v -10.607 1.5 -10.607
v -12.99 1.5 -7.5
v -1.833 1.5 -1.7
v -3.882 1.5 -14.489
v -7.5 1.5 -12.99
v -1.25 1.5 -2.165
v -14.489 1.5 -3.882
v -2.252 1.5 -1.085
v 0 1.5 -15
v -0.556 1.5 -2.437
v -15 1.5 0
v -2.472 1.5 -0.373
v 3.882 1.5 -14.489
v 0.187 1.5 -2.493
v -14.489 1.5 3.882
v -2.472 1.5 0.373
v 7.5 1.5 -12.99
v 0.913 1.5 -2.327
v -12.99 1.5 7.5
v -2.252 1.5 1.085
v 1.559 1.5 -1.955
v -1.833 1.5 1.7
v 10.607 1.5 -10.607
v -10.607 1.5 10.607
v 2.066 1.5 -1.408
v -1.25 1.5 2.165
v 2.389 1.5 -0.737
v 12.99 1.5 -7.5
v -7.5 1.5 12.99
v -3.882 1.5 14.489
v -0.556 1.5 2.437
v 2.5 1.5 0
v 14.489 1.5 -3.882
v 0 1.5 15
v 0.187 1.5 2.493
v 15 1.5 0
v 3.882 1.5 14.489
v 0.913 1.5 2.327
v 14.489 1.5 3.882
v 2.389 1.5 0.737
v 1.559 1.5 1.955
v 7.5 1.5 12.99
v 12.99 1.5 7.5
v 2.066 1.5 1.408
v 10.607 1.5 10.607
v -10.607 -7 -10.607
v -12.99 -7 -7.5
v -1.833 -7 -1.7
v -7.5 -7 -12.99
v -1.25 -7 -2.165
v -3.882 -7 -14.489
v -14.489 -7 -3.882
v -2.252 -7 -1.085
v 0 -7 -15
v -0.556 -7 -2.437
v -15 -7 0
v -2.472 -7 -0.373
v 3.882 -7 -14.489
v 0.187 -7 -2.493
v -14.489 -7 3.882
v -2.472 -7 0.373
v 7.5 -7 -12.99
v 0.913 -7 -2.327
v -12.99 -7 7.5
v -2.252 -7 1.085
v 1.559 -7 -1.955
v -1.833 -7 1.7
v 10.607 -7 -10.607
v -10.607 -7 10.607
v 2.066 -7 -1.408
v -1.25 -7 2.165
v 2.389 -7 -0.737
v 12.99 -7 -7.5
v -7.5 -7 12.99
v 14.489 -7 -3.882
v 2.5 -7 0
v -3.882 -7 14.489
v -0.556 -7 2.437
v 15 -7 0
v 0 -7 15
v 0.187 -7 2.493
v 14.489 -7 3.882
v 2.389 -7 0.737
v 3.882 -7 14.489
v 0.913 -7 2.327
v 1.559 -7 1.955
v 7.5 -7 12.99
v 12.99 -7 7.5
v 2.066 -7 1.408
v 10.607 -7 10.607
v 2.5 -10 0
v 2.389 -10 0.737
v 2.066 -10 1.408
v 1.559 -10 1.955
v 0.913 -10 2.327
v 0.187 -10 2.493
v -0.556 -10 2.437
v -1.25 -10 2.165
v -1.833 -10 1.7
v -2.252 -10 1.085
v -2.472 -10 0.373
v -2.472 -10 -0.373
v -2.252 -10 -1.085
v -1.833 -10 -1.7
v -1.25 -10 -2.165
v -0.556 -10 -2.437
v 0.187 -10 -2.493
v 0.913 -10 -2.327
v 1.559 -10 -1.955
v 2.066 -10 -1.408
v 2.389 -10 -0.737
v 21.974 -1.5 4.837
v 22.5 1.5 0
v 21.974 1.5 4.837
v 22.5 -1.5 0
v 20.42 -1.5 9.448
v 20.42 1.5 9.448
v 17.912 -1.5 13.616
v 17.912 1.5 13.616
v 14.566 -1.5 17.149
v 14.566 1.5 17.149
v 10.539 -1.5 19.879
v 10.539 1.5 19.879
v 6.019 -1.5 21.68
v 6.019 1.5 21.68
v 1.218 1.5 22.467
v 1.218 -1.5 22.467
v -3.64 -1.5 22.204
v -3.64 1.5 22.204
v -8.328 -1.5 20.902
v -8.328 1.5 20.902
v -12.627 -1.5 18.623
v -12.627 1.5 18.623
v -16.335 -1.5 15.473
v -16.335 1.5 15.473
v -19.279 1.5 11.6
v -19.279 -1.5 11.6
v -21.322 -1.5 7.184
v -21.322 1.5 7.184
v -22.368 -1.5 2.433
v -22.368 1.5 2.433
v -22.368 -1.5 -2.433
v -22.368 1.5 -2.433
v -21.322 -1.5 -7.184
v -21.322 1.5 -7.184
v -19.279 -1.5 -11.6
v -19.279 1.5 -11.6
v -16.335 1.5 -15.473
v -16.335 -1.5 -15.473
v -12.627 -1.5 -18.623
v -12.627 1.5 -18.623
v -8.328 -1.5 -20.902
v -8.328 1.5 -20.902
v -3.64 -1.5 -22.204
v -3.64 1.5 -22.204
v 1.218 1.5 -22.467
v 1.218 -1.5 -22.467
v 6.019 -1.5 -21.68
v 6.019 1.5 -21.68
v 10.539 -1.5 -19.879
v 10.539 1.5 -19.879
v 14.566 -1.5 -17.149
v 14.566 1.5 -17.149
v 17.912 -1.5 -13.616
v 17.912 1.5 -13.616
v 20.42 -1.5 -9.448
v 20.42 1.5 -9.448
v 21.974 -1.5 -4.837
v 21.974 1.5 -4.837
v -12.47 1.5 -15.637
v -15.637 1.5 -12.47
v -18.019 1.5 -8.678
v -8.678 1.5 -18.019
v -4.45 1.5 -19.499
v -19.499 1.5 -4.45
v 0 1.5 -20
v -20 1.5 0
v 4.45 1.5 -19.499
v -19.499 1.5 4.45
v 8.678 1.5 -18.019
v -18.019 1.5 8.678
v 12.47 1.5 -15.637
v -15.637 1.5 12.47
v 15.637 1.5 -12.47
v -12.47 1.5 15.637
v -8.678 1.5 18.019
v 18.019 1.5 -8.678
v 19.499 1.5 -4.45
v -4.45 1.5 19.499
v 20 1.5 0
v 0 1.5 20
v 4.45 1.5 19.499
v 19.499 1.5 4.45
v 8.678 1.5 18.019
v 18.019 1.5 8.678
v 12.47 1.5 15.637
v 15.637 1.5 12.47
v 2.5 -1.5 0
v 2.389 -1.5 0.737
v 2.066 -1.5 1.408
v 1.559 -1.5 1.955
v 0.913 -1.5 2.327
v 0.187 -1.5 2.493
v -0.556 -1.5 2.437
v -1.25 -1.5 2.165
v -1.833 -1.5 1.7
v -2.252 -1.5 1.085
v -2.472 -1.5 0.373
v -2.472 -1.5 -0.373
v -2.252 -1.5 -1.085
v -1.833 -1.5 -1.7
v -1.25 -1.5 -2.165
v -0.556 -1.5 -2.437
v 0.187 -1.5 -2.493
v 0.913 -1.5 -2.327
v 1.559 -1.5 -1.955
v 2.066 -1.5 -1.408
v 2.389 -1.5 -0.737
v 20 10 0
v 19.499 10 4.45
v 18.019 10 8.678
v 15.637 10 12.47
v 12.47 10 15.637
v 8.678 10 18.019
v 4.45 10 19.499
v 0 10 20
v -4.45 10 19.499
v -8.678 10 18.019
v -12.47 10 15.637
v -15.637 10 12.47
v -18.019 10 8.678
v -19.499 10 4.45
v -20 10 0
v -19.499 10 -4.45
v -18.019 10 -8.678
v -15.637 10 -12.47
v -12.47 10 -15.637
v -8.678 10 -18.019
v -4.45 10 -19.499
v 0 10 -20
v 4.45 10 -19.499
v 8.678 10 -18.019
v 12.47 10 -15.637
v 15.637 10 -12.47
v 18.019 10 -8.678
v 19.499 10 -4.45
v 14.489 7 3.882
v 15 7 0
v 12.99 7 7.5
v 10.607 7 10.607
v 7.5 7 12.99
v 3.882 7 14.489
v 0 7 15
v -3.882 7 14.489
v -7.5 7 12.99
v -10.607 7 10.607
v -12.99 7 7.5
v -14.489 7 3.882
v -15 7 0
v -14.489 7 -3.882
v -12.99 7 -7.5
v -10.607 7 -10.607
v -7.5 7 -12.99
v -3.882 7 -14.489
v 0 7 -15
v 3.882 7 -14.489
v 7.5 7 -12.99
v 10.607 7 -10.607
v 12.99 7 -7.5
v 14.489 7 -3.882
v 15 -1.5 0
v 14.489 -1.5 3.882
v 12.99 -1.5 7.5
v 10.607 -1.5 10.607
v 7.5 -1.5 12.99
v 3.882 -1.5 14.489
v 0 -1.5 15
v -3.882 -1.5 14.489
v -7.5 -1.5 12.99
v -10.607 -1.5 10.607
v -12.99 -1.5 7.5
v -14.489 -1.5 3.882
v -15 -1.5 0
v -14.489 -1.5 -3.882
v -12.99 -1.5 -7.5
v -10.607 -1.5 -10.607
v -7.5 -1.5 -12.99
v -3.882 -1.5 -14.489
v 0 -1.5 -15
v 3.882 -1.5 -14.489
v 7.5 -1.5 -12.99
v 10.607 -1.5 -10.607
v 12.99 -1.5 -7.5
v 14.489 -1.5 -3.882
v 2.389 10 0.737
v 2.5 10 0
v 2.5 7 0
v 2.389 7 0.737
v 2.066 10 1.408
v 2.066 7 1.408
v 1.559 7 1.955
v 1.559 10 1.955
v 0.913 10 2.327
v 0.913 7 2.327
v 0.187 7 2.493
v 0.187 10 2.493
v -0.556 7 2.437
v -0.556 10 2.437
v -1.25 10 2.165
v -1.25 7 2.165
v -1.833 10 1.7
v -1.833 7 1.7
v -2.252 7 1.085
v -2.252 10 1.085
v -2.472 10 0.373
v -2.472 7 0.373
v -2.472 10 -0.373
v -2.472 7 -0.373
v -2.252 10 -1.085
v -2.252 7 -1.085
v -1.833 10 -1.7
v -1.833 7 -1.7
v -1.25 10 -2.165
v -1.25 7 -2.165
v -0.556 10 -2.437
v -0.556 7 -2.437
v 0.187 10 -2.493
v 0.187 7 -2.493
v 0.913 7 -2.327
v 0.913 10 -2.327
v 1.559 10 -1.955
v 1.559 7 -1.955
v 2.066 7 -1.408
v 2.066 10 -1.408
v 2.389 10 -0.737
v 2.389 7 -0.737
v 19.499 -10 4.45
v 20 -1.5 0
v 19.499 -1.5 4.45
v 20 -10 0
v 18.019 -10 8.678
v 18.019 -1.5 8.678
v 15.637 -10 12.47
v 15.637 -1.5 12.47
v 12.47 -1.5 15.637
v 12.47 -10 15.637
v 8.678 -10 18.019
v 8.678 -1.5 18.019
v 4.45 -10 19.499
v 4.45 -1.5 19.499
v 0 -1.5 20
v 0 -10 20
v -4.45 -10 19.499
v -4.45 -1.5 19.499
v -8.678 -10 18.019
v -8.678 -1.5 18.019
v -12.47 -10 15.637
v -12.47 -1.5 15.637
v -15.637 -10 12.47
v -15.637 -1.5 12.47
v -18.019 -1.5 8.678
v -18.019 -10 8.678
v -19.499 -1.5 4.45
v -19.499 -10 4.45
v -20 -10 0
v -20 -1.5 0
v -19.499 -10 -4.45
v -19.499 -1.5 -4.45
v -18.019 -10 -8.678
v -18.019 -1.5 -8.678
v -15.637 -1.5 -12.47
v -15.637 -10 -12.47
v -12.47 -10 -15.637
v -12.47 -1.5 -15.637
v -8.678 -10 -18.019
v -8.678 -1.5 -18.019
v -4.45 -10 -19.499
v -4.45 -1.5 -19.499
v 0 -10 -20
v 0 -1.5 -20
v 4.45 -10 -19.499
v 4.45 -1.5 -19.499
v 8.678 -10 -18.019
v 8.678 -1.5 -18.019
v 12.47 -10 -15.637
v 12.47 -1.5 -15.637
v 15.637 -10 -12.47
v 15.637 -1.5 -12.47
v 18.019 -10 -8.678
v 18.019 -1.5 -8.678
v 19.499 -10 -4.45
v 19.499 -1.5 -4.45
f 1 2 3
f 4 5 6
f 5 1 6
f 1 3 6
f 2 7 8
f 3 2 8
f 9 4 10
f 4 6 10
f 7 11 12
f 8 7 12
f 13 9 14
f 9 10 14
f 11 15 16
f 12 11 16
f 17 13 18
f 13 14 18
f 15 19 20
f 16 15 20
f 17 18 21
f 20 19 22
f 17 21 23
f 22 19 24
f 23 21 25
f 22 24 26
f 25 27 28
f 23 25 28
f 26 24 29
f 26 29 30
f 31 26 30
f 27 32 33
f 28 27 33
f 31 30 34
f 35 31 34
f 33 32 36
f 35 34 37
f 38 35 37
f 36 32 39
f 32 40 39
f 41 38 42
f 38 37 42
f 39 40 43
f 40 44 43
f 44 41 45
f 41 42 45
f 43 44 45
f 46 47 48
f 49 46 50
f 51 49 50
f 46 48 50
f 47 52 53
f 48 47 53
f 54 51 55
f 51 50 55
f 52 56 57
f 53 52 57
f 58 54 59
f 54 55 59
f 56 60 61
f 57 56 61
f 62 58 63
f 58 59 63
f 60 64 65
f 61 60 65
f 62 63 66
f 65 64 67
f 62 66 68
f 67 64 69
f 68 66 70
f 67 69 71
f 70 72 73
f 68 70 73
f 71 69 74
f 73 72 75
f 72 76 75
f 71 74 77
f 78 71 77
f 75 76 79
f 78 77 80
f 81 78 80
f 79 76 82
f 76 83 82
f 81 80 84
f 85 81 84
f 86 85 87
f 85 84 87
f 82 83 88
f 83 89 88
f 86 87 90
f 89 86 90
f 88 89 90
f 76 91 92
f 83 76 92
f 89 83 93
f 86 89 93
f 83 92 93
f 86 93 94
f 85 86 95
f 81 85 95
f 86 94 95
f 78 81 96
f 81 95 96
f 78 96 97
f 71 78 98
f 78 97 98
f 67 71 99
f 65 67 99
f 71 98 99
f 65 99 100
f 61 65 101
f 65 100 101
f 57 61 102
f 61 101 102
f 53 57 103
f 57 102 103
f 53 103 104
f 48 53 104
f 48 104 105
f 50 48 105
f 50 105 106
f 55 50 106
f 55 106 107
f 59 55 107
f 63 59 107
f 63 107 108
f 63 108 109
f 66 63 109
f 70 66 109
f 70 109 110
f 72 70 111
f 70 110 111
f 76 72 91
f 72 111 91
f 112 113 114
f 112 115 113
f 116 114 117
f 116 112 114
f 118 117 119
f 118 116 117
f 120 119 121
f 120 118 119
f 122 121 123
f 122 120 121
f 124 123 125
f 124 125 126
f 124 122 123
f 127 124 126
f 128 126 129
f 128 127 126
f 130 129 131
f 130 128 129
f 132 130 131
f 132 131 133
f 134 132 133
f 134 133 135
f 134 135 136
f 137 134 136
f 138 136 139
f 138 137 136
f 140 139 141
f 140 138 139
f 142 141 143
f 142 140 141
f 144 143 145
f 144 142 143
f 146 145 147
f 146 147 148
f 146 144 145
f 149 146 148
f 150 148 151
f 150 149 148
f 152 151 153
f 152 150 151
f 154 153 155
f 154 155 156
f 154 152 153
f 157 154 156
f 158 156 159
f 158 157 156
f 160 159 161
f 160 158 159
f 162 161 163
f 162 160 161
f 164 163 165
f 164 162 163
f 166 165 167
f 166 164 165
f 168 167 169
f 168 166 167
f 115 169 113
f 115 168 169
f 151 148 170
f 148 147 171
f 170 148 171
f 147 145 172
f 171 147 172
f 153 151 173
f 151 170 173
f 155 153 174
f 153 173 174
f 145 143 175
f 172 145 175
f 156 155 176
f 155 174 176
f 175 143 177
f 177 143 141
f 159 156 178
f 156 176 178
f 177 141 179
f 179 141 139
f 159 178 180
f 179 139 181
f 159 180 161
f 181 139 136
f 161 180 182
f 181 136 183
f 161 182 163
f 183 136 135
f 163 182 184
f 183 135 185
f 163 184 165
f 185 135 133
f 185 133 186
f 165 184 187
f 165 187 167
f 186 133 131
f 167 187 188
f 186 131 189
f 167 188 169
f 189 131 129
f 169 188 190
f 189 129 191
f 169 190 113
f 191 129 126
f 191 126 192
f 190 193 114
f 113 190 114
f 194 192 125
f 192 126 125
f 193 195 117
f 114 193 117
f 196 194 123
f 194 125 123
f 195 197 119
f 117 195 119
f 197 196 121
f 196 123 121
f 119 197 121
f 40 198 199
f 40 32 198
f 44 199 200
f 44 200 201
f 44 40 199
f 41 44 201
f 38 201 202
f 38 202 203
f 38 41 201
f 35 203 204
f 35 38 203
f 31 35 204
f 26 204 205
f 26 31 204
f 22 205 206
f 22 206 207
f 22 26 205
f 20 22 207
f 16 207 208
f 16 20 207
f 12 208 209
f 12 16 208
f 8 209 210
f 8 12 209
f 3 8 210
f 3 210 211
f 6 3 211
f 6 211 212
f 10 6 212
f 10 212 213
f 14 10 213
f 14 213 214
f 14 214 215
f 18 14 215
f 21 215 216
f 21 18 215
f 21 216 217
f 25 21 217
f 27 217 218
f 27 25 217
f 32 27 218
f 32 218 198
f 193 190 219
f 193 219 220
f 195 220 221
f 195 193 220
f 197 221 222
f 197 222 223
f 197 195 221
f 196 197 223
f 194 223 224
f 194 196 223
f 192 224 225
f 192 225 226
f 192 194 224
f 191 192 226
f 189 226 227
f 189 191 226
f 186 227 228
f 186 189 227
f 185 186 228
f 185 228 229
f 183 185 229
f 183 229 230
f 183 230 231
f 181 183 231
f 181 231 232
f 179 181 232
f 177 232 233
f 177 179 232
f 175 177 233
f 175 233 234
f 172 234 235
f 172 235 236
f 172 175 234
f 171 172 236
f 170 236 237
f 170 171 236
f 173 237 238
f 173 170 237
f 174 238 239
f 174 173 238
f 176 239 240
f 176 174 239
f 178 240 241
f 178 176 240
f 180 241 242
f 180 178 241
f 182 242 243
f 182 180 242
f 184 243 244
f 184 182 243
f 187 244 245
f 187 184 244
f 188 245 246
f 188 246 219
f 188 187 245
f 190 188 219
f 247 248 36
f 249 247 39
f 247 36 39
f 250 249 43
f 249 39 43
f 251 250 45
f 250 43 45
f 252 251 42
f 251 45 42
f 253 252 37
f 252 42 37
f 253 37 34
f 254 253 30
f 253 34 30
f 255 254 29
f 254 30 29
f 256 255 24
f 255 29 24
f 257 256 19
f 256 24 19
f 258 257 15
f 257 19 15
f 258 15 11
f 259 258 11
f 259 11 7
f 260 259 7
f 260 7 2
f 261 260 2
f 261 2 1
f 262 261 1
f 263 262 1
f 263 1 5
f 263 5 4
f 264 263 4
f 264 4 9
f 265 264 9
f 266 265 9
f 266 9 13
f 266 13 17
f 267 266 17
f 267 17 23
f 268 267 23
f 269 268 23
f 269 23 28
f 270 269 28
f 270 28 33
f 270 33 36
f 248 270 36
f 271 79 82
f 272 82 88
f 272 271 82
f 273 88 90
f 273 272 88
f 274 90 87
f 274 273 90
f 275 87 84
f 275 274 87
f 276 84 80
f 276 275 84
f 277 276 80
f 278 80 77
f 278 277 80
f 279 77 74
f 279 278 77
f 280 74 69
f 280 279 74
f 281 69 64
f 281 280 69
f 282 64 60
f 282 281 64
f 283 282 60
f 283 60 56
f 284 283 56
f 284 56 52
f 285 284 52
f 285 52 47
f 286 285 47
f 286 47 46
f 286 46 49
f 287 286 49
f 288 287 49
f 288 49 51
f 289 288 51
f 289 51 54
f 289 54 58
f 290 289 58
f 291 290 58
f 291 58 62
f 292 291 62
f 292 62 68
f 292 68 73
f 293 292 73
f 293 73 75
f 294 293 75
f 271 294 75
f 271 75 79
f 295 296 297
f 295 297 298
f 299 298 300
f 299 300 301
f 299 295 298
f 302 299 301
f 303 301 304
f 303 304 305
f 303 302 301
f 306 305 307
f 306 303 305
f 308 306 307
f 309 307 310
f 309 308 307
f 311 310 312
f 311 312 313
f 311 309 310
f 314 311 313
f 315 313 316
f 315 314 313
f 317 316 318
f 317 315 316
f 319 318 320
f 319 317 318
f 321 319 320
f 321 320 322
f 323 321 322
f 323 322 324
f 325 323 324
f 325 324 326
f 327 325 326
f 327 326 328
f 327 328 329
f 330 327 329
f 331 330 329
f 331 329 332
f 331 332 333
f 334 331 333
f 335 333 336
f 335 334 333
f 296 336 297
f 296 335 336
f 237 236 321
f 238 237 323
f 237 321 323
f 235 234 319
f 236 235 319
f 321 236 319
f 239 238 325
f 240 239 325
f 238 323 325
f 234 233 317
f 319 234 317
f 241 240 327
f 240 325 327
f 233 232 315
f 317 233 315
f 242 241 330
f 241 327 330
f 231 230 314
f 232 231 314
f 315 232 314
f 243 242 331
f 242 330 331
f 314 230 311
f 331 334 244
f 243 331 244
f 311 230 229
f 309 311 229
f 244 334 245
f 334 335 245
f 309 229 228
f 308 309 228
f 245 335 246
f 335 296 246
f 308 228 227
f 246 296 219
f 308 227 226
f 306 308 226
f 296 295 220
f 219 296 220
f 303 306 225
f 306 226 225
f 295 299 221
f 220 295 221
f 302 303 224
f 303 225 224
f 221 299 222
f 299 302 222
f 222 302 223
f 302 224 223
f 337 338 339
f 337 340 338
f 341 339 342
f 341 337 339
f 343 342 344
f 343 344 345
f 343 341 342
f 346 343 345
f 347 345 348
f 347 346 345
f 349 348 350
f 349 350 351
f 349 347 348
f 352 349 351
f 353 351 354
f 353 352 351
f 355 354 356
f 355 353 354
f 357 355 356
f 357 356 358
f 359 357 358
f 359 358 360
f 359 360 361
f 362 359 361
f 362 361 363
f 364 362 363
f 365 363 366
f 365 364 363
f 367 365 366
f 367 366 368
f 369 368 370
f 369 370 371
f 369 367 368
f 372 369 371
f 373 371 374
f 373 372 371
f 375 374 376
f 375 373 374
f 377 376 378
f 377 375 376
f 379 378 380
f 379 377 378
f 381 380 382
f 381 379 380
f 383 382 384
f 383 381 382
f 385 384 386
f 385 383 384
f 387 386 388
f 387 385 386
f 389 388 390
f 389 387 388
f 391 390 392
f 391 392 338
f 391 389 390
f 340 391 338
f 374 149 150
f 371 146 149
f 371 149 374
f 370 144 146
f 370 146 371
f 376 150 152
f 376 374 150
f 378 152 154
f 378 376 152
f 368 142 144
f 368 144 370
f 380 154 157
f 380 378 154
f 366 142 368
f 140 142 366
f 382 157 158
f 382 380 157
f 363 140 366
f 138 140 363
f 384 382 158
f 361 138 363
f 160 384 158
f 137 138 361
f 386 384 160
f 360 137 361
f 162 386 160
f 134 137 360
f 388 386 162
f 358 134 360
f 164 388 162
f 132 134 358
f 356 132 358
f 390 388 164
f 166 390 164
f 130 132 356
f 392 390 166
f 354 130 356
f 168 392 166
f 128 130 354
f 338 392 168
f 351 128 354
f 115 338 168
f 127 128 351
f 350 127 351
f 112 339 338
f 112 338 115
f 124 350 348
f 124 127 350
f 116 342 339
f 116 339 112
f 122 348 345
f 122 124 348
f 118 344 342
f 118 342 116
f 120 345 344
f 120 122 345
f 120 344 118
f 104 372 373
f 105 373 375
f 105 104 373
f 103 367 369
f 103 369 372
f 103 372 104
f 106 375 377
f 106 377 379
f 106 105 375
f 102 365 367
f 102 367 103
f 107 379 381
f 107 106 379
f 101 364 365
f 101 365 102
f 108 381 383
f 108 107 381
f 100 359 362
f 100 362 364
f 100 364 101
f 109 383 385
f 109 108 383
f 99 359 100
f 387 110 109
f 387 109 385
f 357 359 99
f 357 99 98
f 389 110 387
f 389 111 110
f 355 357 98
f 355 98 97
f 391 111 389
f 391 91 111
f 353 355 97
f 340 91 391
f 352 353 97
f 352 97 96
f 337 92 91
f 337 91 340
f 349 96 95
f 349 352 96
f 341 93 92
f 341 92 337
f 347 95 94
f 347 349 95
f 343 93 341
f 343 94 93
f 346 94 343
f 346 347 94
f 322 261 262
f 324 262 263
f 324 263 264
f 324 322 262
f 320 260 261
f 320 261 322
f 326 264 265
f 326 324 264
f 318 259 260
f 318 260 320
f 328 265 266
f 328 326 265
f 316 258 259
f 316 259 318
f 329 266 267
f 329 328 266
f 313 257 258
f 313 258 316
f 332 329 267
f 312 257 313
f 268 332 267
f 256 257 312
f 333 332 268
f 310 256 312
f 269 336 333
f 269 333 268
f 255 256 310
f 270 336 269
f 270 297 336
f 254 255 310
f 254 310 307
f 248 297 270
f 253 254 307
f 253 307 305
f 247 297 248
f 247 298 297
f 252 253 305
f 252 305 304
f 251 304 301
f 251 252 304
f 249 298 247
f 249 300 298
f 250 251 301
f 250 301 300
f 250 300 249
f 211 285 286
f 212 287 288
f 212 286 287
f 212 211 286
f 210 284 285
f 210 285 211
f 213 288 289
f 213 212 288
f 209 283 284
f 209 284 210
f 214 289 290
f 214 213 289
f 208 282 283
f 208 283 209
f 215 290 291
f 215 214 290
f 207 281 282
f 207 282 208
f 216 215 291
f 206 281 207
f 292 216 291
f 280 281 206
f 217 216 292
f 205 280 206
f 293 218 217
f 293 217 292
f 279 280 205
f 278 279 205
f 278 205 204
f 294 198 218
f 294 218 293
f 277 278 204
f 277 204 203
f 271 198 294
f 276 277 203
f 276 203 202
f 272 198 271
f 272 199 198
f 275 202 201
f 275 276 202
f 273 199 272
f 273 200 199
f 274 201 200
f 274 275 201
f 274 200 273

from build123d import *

# Parameters (mm, degrees)
F0_R     = 20
F0_R_2   = 15
F1_DEPTH = 10
F3_R     = 22.5
F3_R_2   = 2.5
F4_DEPTH = 1.5
F7_R     = 15
F7_R_2   = 2.5
F8_DEPTH = 3


with BuildPart() as f1:
    # F0 (on Front) → F1 (new body)
    with BuildSketch(Plane.XZ):
        Circle(F0_R)
        Circle(F0_R_2, mode=Mode.SUBTRACT)
    extrude(amount=F1_DEPTH)

    # F2: F1 across plane


with BuildPart() as f1_1:
    add(f1.part)
    add(f1.part.mirror(Plane.XZ))

    # F3 (on Front) → F4 (join)
    with BuildSketch(Plane.XZ):
        Circle(F3_R)
        Circle(F3_R_2, mode=Mode.SUBTRACT)
    extrude(amount=F4_DEPTH)

    # F5: F1 across plane


with BuildPart() as f1_2:
    add(f1_1.part)
    add(f1_1.part.mirror(Plane.XZ))

    # F7 (on offset) → F8 (join)
    with BuildSketch(Plane.XZ.offset(10)):
        Circle(F7_R)
        Circle(F7_R_2, mode=Mode.SUBTRACT)
    extrude(amount=-F8_DEPTH)

    # F9: F1 across plane


with BuildPart() as f1_3:
    add(f1_2.part)
    add(f1_2.part.mirror(Plane.XZ))


solid = f1_3.part
